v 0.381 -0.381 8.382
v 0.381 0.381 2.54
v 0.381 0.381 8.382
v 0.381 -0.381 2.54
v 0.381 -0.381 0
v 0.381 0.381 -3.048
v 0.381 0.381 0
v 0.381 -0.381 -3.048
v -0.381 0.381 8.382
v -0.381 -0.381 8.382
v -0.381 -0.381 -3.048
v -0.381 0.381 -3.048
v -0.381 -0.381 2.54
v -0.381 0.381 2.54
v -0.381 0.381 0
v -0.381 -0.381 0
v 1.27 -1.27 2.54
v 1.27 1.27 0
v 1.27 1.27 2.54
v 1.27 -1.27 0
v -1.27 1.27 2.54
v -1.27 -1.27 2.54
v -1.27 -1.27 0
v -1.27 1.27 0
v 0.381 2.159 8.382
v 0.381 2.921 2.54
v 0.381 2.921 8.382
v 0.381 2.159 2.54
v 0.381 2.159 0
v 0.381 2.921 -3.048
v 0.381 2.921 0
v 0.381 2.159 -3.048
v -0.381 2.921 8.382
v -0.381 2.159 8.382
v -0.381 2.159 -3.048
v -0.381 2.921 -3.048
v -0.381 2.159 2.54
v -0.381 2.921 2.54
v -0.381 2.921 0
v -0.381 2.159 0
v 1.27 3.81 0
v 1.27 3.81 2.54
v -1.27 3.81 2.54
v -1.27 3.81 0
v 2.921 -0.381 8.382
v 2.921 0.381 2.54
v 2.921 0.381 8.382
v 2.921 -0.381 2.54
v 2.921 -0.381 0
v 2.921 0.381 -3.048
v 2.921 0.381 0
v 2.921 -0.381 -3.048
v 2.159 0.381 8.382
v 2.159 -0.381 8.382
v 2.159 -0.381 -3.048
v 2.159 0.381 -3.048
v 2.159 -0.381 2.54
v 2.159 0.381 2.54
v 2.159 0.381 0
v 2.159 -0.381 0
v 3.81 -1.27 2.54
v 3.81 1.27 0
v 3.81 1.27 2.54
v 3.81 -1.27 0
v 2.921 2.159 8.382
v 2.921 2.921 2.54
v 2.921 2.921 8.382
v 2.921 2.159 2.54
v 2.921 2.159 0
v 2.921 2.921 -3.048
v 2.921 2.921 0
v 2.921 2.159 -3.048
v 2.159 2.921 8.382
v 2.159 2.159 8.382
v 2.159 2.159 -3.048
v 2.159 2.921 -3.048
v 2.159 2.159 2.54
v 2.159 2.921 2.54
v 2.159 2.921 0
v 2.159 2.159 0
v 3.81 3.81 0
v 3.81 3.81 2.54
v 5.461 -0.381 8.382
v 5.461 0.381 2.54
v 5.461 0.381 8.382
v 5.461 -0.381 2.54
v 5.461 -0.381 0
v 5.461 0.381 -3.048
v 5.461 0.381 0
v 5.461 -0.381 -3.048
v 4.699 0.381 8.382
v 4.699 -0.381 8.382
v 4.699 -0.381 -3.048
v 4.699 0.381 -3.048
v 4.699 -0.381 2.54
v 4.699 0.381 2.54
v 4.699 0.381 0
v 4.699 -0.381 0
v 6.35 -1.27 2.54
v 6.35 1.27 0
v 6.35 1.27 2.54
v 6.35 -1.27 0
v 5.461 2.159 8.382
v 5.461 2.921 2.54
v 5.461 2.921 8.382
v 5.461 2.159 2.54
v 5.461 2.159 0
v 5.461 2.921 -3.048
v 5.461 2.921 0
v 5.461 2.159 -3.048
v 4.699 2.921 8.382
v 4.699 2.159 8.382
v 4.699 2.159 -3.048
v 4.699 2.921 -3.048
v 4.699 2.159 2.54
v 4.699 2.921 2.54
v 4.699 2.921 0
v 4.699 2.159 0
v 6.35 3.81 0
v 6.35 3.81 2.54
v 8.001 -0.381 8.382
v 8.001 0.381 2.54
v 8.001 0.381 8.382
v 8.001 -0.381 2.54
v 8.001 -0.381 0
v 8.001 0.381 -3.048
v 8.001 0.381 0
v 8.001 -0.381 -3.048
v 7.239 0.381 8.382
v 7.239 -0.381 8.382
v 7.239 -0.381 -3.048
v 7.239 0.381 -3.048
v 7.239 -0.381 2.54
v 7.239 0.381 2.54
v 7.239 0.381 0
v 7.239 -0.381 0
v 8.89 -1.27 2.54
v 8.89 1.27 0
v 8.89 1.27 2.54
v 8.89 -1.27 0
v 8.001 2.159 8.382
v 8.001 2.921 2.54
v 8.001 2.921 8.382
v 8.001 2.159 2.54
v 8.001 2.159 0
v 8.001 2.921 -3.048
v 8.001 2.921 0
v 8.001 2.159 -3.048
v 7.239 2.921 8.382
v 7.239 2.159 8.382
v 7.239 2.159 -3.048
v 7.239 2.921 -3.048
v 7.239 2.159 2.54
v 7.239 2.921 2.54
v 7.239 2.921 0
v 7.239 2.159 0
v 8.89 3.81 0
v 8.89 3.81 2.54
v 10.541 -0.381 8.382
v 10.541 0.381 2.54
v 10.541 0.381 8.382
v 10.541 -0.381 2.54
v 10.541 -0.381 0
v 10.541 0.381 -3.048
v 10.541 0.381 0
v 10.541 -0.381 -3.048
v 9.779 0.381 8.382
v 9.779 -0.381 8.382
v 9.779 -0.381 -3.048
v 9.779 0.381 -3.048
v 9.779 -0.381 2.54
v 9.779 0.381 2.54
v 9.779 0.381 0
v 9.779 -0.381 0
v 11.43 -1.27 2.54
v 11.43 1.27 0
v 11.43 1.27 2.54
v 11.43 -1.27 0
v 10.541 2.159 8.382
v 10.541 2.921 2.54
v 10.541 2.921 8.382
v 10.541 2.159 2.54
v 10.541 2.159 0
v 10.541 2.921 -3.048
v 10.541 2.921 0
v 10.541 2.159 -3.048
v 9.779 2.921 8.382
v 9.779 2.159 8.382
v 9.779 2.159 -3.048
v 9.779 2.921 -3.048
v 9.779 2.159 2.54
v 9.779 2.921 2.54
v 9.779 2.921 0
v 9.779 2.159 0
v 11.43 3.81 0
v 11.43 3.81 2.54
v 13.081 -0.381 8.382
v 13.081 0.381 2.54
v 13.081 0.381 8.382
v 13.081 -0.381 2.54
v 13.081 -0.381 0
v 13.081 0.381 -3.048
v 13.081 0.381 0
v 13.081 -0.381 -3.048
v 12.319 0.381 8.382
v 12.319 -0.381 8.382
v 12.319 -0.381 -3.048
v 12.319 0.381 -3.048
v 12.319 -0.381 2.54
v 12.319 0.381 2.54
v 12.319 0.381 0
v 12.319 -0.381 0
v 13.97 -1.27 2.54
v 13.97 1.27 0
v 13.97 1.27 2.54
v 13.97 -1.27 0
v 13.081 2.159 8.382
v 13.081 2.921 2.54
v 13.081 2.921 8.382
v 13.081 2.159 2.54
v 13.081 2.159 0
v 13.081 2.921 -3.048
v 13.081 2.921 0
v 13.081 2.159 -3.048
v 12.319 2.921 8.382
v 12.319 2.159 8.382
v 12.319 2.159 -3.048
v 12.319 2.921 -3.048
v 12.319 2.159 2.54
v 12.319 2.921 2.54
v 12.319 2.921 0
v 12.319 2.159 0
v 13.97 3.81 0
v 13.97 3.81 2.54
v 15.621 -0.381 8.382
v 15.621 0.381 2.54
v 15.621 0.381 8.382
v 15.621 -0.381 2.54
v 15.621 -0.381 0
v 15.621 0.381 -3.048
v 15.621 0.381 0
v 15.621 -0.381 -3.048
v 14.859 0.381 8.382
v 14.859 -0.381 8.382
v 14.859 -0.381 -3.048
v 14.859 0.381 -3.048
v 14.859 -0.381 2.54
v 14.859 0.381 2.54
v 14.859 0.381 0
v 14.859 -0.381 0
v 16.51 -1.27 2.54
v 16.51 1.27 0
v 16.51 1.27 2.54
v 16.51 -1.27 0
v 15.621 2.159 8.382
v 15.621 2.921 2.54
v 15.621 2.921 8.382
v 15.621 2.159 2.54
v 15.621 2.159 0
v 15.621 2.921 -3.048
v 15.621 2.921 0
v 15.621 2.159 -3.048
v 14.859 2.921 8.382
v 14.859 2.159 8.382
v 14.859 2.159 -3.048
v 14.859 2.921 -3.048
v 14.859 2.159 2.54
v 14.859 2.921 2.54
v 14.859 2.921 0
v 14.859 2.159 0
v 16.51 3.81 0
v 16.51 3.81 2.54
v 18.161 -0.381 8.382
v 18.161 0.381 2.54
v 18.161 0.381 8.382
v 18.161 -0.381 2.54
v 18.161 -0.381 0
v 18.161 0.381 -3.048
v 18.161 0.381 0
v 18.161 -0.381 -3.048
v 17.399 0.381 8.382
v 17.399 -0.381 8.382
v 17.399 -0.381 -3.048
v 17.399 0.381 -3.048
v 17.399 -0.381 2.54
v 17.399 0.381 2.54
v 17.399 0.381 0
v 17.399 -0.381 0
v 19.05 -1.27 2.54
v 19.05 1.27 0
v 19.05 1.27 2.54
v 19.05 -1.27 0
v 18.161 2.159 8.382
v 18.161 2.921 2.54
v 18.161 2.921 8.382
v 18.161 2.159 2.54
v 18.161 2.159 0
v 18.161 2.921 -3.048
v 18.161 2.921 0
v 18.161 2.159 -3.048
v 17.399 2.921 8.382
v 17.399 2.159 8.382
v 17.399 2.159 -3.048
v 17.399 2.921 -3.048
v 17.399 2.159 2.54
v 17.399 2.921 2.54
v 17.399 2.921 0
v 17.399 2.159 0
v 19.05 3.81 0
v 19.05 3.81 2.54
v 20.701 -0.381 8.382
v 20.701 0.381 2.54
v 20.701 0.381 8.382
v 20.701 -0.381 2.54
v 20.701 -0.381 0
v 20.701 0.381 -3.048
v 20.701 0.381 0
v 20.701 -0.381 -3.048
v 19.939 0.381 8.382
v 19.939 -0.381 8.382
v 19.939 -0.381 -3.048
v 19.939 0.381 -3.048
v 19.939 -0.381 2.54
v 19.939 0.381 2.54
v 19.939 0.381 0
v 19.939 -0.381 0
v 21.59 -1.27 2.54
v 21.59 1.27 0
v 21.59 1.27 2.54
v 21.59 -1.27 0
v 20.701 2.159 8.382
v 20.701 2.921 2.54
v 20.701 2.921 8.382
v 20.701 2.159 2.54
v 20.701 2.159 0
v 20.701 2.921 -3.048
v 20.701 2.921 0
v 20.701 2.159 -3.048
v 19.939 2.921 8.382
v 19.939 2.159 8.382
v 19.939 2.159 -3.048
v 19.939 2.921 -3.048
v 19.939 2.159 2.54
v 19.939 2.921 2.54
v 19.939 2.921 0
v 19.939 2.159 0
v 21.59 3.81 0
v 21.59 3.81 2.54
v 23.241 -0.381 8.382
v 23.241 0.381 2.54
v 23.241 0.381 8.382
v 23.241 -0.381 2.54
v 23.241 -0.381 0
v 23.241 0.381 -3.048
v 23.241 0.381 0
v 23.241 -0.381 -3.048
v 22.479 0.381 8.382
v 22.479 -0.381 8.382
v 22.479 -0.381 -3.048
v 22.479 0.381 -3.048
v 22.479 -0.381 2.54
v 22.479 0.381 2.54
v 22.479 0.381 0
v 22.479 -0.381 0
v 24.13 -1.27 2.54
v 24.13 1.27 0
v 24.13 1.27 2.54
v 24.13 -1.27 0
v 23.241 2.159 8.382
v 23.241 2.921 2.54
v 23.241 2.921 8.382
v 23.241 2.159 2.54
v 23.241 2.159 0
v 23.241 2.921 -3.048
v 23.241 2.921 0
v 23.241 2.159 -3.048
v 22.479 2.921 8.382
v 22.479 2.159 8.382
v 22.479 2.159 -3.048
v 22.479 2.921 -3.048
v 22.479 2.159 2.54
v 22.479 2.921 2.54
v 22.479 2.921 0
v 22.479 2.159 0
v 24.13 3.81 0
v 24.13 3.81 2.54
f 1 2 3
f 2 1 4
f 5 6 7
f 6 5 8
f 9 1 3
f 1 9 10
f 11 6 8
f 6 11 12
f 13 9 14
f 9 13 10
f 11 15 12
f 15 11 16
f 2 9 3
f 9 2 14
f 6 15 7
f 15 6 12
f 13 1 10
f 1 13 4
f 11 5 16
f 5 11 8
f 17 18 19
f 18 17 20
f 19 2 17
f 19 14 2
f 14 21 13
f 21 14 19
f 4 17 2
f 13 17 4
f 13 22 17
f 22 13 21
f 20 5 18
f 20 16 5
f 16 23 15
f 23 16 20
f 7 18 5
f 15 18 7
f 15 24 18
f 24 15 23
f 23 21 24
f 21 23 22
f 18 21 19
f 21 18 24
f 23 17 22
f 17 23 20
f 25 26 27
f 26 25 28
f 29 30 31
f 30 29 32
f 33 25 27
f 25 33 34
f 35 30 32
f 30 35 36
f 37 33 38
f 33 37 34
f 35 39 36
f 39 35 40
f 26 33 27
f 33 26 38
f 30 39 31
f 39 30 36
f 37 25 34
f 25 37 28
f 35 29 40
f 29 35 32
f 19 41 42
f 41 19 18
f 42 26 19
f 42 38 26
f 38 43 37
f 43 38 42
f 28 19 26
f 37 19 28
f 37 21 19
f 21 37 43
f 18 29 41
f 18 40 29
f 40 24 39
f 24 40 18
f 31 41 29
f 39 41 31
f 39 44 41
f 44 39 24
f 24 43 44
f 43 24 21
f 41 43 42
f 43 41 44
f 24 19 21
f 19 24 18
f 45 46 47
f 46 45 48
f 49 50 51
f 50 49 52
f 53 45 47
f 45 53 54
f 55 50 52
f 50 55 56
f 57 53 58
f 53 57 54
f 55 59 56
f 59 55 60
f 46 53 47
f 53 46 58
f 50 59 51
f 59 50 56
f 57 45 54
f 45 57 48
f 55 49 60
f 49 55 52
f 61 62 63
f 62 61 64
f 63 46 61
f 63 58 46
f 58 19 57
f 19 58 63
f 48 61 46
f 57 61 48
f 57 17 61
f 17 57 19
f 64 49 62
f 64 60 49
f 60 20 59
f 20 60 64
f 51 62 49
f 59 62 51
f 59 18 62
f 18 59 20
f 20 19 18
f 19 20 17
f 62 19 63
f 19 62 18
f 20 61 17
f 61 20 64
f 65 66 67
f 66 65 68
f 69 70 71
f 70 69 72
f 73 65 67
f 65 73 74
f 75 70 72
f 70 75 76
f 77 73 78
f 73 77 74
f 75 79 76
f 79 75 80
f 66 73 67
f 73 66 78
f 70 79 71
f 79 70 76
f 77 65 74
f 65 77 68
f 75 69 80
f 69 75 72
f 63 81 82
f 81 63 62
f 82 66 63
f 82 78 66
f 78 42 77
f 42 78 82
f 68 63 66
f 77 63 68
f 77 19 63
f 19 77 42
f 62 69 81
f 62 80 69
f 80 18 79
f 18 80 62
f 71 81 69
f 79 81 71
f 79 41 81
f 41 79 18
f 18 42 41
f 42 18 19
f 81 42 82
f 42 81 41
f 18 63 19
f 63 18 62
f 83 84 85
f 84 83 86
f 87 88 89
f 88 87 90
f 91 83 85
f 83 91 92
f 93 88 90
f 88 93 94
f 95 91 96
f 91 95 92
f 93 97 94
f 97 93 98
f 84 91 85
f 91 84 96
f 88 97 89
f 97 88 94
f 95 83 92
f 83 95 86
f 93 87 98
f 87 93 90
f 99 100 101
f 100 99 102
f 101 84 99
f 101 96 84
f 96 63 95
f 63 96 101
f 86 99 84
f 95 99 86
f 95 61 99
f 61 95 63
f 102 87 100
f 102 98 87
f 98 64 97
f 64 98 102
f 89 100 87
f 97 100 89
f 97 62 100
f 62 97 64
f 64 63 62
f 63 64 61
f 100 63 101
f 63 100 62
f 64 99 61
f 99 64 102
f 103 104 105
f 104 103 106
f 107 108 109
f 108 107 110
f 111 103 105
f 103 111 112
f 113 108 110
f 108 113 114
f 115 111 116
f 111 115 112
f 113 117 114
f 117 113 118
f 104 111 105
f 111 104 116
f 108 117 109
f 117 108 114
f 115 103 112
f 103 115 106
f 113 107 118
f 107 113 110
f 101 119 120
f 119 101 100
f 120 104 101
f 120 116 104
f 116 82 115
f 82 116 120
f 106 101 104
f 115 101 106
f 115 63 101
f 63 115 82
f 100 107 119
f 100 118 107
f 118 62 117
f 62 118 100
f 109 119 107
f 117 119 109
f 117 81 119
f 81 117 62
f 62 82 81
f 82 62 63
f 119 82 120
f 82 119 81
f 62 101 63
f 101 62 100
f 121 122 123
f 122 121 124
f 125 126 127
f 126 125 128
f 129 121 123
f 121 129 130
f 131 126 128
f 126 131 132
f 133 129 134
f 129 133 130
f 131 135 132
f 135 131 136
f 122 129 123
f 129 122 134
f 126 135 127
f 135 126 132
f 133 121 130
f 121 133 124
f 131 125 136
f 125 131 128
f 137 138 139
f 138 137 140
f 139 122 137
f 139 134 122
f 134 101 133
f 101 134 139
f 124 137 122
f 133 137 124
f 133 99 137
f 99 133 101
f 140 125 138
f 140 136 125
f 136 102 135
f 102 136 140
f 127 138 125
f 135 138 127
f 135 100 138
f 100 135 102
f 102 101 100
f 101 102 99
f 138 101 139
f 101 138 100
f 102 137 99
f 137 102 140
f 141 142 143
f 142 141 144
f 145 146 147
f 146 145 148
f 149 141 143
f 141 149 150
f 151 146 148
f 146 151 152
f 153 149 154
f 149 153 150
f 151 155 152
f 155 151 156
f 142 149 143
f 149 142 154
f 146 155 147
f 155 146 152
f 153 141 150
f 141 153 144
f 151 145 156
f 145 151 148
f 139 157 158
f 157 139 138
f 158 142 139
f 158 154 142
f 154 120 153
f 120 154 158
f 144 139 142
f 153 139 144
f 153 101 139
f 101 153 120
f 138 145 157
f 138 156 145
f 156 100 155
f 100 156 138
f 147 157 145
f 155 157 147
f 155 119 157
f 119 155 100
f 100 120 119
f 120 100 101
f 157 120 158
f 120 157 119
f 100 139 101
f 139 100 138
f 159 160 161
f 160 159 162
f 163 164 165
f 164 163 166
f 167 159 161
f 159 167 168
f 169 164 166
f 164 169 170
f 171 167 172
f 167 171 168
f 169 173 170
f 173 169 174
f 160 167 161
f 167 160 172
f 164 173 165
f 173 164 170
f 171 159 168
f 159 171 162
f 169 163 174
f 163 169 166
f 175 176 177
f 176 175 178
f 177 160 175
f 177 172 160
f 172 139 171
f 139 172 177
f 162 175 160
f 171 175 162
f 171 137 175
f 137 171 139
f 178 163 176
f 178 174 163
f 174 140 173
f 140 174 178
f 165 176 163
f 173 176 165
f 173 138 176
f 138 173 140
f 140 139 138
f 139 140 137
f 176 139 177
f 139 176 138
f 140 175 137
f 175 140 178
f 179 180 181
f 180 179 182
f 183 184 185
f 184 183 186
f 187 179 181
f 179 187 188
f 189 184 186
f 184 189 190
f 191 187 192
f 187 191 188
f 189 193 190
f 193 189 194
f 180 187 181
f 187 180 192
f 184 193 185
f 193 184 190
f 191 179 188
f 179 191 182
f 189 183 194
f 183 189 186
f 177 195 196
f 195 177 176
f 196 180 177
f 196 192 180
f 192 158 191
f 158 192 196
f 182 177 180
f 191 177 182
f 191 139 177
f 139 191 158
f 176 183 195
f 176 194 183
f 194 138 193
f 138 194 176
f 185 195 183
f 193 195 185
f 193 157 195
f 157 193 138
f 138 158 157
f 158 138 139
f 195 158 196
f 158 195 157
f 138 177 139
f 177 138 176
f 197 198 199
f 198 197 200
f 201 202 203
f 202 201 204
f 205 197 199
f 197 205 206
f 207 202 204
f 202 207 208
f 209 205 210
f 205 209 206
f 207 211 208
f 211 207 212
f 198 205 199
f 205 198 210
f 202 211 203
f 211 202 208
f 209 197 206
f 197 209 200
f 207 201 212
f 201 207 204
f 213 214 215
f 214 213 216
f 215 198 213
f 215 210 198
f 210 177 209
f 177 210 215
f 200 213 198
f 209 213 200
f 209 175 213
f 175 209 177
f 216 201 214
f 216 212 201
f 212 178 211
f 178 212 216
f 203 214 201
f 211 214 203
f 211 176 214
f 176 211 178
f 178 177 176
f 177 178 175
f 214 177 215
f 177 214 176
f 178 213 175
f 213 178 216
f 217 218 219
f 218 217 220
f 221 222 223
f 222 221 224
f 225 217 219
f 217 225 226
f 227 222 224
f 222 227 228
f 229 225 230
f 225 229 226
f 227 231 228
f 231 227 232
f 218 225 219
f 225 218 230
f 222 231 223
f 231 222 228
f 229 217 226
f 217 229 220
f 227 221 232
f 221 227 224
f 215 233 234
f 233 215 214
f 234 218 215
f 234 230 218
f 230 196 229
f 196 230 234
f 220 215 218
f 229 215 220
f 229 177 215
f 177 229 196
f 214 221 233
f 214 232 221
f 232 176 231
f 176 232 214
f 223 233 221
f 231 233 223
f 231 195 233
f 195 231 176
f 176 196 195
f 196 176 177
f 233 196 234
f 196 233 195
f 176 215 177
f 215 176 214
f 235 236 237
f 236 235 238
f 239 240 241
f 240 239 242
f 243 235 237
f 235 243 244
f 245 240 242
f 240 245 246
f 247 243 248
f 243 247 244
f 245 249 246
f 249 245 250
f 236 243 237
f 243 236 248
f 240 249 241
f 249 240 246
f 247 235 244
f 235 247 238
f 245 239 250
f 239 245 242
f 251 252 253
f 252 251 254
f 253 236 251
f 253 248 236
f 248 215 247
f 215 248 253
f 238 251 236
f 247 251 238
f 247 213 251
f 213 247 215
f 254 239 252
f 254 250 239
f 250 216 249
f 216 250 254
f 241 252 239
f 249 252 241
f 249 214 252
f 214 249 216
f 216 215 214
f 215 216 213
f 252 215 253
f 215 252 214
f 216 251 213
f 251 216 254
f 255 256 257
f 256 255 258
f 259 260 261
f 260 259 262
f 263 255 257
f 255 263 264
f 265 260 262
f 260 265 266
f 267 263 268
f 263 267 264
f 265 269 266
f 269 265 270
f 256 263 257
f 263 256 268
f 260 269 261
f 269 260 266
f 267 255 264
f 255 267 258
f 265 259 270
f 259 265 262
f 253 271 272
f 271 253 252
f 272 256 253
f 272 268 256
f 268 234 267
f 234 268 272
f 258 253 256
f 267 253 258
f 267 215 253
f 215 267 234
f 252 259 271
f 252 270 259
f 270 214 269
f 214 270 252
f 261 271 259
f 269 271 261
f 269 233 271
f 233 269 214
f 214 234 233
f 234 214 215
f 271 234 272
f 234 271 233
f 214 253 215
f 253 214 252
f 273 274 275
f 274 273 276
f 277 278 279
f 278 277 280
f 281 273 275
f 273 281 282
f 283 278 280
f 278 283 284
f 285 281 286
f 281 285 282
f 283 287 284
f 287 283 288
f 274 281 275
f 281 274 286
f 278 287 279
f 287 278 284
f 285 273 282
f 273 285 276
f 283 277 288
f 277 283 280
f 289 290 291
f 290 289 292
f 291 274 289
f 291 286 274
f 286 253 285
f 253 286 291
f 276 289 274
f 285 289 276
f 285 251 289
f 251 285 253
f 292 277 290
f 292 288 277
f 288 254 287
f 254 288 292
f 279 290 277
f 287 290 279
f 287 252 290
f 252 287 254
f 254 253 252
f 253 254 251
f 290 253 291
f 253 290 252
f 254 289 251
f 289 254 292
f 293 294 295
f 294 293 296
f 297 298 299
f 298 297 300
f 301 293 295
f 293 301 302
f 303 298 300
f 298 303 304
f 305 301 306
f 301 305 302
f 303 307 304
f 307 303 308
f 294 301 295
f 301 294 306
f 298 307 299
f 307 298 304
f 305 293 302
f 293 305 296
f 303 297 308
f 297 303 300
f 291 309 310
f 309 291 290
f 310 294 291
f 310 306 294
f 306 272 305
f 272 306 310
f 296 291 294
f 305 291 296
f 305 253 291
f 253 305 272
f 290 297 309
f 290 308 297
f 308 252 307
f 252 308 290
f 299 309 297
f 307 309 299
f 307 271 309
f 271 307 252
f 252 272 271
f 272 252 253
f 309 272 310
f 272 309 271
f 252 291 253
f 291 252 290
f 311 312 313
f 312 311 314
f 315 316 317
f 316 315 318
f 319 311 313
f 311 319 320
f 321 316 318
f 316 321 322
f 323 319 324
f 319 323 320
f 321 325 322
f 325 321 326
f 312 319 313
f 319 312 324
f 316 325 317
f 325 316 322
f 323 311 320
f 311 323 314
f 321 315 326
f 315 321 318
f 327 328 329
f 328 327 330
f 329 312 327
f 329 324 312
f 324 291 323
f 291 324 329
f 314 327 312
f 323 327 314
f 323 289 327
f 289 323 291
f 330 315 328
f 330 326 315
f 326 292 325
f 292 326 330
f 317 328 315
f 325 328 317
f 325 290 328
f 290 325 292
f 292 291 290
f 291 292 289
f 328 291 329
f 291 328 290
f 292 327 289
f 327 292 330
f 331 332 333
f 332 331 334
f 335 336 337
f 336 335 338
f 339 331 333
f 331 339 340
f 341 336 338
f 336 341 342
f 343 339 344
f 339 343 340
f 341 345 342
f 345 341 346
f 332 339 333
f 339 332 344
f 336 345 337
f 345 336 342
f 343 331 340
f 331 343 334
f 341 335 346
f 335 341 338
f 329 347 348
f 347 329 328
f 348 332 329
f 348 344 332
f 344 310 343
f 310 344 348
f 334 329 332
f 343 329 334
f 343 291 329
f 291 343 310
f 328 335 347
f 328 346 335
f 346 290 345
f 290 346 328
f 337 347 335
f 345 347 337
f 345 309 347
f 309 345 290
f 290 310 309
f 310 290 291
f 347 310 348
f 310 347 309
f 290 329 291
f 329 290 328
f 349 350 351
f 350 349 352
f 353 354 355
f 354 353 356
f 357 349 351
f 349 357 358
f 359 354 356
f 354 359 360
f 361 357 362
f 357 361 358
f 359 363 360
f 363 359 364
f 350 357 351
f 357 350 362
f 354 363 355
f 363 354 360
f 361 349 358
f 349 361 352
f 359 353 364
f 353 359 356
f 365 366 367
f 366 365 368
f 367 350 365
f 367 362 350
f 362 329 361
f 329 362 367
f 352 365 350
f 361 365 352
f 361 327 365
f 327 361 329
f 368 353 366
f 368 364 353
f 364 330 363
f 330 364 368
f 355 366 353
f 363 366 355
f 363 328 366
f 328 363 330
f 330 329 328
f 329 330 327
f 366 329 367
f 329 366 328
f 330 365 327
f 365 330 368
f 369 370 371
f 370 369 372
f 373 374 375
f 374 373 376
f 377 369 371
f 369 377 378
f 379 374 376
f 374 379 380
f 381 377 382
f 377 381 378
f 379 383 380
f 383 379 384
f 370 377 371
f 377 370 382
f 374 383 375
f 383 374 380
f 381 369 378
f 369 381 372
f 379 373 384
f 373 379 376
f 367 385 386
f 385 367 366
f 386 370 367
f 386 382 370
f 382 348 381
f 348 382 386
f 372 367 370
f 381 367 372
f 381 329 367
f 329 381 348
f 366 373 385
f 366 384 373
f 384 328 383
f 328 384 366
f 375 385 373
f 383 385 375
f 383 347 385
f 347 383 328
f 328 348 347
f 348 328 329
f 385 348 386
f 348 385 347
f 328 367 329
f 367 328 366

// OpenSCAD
module pinM(x,y){
    millis= 0.0254;
    pin=    30*millis;
    pinH=   450*millis;
    space=  100*millis;
    cut=    10*millis;
    mXY=[   [0,0,0], 
            [0,1,0],
            [1,0,0],
            [1,1,0]]; //mirror XY
for (x=[0:1:x-1], y=[0:1:y-1]) translate([x*2.54,y*2.54,0]) {
   
    color("gold")
    translate ([-pin/2,-pin/2,-120*millis]) cube([pin,pin,pinH]);    
    color([0.15,0.15,0.15,1]) 
    difference(){
        translate(-[space,space]/2) cube([space,space,space]);
//        for (i=mXY) mirror(i) translate([space,space]/2)cylinder(space,cut,cut,$fn=8);
    }
}
}
pinM(10,2);
